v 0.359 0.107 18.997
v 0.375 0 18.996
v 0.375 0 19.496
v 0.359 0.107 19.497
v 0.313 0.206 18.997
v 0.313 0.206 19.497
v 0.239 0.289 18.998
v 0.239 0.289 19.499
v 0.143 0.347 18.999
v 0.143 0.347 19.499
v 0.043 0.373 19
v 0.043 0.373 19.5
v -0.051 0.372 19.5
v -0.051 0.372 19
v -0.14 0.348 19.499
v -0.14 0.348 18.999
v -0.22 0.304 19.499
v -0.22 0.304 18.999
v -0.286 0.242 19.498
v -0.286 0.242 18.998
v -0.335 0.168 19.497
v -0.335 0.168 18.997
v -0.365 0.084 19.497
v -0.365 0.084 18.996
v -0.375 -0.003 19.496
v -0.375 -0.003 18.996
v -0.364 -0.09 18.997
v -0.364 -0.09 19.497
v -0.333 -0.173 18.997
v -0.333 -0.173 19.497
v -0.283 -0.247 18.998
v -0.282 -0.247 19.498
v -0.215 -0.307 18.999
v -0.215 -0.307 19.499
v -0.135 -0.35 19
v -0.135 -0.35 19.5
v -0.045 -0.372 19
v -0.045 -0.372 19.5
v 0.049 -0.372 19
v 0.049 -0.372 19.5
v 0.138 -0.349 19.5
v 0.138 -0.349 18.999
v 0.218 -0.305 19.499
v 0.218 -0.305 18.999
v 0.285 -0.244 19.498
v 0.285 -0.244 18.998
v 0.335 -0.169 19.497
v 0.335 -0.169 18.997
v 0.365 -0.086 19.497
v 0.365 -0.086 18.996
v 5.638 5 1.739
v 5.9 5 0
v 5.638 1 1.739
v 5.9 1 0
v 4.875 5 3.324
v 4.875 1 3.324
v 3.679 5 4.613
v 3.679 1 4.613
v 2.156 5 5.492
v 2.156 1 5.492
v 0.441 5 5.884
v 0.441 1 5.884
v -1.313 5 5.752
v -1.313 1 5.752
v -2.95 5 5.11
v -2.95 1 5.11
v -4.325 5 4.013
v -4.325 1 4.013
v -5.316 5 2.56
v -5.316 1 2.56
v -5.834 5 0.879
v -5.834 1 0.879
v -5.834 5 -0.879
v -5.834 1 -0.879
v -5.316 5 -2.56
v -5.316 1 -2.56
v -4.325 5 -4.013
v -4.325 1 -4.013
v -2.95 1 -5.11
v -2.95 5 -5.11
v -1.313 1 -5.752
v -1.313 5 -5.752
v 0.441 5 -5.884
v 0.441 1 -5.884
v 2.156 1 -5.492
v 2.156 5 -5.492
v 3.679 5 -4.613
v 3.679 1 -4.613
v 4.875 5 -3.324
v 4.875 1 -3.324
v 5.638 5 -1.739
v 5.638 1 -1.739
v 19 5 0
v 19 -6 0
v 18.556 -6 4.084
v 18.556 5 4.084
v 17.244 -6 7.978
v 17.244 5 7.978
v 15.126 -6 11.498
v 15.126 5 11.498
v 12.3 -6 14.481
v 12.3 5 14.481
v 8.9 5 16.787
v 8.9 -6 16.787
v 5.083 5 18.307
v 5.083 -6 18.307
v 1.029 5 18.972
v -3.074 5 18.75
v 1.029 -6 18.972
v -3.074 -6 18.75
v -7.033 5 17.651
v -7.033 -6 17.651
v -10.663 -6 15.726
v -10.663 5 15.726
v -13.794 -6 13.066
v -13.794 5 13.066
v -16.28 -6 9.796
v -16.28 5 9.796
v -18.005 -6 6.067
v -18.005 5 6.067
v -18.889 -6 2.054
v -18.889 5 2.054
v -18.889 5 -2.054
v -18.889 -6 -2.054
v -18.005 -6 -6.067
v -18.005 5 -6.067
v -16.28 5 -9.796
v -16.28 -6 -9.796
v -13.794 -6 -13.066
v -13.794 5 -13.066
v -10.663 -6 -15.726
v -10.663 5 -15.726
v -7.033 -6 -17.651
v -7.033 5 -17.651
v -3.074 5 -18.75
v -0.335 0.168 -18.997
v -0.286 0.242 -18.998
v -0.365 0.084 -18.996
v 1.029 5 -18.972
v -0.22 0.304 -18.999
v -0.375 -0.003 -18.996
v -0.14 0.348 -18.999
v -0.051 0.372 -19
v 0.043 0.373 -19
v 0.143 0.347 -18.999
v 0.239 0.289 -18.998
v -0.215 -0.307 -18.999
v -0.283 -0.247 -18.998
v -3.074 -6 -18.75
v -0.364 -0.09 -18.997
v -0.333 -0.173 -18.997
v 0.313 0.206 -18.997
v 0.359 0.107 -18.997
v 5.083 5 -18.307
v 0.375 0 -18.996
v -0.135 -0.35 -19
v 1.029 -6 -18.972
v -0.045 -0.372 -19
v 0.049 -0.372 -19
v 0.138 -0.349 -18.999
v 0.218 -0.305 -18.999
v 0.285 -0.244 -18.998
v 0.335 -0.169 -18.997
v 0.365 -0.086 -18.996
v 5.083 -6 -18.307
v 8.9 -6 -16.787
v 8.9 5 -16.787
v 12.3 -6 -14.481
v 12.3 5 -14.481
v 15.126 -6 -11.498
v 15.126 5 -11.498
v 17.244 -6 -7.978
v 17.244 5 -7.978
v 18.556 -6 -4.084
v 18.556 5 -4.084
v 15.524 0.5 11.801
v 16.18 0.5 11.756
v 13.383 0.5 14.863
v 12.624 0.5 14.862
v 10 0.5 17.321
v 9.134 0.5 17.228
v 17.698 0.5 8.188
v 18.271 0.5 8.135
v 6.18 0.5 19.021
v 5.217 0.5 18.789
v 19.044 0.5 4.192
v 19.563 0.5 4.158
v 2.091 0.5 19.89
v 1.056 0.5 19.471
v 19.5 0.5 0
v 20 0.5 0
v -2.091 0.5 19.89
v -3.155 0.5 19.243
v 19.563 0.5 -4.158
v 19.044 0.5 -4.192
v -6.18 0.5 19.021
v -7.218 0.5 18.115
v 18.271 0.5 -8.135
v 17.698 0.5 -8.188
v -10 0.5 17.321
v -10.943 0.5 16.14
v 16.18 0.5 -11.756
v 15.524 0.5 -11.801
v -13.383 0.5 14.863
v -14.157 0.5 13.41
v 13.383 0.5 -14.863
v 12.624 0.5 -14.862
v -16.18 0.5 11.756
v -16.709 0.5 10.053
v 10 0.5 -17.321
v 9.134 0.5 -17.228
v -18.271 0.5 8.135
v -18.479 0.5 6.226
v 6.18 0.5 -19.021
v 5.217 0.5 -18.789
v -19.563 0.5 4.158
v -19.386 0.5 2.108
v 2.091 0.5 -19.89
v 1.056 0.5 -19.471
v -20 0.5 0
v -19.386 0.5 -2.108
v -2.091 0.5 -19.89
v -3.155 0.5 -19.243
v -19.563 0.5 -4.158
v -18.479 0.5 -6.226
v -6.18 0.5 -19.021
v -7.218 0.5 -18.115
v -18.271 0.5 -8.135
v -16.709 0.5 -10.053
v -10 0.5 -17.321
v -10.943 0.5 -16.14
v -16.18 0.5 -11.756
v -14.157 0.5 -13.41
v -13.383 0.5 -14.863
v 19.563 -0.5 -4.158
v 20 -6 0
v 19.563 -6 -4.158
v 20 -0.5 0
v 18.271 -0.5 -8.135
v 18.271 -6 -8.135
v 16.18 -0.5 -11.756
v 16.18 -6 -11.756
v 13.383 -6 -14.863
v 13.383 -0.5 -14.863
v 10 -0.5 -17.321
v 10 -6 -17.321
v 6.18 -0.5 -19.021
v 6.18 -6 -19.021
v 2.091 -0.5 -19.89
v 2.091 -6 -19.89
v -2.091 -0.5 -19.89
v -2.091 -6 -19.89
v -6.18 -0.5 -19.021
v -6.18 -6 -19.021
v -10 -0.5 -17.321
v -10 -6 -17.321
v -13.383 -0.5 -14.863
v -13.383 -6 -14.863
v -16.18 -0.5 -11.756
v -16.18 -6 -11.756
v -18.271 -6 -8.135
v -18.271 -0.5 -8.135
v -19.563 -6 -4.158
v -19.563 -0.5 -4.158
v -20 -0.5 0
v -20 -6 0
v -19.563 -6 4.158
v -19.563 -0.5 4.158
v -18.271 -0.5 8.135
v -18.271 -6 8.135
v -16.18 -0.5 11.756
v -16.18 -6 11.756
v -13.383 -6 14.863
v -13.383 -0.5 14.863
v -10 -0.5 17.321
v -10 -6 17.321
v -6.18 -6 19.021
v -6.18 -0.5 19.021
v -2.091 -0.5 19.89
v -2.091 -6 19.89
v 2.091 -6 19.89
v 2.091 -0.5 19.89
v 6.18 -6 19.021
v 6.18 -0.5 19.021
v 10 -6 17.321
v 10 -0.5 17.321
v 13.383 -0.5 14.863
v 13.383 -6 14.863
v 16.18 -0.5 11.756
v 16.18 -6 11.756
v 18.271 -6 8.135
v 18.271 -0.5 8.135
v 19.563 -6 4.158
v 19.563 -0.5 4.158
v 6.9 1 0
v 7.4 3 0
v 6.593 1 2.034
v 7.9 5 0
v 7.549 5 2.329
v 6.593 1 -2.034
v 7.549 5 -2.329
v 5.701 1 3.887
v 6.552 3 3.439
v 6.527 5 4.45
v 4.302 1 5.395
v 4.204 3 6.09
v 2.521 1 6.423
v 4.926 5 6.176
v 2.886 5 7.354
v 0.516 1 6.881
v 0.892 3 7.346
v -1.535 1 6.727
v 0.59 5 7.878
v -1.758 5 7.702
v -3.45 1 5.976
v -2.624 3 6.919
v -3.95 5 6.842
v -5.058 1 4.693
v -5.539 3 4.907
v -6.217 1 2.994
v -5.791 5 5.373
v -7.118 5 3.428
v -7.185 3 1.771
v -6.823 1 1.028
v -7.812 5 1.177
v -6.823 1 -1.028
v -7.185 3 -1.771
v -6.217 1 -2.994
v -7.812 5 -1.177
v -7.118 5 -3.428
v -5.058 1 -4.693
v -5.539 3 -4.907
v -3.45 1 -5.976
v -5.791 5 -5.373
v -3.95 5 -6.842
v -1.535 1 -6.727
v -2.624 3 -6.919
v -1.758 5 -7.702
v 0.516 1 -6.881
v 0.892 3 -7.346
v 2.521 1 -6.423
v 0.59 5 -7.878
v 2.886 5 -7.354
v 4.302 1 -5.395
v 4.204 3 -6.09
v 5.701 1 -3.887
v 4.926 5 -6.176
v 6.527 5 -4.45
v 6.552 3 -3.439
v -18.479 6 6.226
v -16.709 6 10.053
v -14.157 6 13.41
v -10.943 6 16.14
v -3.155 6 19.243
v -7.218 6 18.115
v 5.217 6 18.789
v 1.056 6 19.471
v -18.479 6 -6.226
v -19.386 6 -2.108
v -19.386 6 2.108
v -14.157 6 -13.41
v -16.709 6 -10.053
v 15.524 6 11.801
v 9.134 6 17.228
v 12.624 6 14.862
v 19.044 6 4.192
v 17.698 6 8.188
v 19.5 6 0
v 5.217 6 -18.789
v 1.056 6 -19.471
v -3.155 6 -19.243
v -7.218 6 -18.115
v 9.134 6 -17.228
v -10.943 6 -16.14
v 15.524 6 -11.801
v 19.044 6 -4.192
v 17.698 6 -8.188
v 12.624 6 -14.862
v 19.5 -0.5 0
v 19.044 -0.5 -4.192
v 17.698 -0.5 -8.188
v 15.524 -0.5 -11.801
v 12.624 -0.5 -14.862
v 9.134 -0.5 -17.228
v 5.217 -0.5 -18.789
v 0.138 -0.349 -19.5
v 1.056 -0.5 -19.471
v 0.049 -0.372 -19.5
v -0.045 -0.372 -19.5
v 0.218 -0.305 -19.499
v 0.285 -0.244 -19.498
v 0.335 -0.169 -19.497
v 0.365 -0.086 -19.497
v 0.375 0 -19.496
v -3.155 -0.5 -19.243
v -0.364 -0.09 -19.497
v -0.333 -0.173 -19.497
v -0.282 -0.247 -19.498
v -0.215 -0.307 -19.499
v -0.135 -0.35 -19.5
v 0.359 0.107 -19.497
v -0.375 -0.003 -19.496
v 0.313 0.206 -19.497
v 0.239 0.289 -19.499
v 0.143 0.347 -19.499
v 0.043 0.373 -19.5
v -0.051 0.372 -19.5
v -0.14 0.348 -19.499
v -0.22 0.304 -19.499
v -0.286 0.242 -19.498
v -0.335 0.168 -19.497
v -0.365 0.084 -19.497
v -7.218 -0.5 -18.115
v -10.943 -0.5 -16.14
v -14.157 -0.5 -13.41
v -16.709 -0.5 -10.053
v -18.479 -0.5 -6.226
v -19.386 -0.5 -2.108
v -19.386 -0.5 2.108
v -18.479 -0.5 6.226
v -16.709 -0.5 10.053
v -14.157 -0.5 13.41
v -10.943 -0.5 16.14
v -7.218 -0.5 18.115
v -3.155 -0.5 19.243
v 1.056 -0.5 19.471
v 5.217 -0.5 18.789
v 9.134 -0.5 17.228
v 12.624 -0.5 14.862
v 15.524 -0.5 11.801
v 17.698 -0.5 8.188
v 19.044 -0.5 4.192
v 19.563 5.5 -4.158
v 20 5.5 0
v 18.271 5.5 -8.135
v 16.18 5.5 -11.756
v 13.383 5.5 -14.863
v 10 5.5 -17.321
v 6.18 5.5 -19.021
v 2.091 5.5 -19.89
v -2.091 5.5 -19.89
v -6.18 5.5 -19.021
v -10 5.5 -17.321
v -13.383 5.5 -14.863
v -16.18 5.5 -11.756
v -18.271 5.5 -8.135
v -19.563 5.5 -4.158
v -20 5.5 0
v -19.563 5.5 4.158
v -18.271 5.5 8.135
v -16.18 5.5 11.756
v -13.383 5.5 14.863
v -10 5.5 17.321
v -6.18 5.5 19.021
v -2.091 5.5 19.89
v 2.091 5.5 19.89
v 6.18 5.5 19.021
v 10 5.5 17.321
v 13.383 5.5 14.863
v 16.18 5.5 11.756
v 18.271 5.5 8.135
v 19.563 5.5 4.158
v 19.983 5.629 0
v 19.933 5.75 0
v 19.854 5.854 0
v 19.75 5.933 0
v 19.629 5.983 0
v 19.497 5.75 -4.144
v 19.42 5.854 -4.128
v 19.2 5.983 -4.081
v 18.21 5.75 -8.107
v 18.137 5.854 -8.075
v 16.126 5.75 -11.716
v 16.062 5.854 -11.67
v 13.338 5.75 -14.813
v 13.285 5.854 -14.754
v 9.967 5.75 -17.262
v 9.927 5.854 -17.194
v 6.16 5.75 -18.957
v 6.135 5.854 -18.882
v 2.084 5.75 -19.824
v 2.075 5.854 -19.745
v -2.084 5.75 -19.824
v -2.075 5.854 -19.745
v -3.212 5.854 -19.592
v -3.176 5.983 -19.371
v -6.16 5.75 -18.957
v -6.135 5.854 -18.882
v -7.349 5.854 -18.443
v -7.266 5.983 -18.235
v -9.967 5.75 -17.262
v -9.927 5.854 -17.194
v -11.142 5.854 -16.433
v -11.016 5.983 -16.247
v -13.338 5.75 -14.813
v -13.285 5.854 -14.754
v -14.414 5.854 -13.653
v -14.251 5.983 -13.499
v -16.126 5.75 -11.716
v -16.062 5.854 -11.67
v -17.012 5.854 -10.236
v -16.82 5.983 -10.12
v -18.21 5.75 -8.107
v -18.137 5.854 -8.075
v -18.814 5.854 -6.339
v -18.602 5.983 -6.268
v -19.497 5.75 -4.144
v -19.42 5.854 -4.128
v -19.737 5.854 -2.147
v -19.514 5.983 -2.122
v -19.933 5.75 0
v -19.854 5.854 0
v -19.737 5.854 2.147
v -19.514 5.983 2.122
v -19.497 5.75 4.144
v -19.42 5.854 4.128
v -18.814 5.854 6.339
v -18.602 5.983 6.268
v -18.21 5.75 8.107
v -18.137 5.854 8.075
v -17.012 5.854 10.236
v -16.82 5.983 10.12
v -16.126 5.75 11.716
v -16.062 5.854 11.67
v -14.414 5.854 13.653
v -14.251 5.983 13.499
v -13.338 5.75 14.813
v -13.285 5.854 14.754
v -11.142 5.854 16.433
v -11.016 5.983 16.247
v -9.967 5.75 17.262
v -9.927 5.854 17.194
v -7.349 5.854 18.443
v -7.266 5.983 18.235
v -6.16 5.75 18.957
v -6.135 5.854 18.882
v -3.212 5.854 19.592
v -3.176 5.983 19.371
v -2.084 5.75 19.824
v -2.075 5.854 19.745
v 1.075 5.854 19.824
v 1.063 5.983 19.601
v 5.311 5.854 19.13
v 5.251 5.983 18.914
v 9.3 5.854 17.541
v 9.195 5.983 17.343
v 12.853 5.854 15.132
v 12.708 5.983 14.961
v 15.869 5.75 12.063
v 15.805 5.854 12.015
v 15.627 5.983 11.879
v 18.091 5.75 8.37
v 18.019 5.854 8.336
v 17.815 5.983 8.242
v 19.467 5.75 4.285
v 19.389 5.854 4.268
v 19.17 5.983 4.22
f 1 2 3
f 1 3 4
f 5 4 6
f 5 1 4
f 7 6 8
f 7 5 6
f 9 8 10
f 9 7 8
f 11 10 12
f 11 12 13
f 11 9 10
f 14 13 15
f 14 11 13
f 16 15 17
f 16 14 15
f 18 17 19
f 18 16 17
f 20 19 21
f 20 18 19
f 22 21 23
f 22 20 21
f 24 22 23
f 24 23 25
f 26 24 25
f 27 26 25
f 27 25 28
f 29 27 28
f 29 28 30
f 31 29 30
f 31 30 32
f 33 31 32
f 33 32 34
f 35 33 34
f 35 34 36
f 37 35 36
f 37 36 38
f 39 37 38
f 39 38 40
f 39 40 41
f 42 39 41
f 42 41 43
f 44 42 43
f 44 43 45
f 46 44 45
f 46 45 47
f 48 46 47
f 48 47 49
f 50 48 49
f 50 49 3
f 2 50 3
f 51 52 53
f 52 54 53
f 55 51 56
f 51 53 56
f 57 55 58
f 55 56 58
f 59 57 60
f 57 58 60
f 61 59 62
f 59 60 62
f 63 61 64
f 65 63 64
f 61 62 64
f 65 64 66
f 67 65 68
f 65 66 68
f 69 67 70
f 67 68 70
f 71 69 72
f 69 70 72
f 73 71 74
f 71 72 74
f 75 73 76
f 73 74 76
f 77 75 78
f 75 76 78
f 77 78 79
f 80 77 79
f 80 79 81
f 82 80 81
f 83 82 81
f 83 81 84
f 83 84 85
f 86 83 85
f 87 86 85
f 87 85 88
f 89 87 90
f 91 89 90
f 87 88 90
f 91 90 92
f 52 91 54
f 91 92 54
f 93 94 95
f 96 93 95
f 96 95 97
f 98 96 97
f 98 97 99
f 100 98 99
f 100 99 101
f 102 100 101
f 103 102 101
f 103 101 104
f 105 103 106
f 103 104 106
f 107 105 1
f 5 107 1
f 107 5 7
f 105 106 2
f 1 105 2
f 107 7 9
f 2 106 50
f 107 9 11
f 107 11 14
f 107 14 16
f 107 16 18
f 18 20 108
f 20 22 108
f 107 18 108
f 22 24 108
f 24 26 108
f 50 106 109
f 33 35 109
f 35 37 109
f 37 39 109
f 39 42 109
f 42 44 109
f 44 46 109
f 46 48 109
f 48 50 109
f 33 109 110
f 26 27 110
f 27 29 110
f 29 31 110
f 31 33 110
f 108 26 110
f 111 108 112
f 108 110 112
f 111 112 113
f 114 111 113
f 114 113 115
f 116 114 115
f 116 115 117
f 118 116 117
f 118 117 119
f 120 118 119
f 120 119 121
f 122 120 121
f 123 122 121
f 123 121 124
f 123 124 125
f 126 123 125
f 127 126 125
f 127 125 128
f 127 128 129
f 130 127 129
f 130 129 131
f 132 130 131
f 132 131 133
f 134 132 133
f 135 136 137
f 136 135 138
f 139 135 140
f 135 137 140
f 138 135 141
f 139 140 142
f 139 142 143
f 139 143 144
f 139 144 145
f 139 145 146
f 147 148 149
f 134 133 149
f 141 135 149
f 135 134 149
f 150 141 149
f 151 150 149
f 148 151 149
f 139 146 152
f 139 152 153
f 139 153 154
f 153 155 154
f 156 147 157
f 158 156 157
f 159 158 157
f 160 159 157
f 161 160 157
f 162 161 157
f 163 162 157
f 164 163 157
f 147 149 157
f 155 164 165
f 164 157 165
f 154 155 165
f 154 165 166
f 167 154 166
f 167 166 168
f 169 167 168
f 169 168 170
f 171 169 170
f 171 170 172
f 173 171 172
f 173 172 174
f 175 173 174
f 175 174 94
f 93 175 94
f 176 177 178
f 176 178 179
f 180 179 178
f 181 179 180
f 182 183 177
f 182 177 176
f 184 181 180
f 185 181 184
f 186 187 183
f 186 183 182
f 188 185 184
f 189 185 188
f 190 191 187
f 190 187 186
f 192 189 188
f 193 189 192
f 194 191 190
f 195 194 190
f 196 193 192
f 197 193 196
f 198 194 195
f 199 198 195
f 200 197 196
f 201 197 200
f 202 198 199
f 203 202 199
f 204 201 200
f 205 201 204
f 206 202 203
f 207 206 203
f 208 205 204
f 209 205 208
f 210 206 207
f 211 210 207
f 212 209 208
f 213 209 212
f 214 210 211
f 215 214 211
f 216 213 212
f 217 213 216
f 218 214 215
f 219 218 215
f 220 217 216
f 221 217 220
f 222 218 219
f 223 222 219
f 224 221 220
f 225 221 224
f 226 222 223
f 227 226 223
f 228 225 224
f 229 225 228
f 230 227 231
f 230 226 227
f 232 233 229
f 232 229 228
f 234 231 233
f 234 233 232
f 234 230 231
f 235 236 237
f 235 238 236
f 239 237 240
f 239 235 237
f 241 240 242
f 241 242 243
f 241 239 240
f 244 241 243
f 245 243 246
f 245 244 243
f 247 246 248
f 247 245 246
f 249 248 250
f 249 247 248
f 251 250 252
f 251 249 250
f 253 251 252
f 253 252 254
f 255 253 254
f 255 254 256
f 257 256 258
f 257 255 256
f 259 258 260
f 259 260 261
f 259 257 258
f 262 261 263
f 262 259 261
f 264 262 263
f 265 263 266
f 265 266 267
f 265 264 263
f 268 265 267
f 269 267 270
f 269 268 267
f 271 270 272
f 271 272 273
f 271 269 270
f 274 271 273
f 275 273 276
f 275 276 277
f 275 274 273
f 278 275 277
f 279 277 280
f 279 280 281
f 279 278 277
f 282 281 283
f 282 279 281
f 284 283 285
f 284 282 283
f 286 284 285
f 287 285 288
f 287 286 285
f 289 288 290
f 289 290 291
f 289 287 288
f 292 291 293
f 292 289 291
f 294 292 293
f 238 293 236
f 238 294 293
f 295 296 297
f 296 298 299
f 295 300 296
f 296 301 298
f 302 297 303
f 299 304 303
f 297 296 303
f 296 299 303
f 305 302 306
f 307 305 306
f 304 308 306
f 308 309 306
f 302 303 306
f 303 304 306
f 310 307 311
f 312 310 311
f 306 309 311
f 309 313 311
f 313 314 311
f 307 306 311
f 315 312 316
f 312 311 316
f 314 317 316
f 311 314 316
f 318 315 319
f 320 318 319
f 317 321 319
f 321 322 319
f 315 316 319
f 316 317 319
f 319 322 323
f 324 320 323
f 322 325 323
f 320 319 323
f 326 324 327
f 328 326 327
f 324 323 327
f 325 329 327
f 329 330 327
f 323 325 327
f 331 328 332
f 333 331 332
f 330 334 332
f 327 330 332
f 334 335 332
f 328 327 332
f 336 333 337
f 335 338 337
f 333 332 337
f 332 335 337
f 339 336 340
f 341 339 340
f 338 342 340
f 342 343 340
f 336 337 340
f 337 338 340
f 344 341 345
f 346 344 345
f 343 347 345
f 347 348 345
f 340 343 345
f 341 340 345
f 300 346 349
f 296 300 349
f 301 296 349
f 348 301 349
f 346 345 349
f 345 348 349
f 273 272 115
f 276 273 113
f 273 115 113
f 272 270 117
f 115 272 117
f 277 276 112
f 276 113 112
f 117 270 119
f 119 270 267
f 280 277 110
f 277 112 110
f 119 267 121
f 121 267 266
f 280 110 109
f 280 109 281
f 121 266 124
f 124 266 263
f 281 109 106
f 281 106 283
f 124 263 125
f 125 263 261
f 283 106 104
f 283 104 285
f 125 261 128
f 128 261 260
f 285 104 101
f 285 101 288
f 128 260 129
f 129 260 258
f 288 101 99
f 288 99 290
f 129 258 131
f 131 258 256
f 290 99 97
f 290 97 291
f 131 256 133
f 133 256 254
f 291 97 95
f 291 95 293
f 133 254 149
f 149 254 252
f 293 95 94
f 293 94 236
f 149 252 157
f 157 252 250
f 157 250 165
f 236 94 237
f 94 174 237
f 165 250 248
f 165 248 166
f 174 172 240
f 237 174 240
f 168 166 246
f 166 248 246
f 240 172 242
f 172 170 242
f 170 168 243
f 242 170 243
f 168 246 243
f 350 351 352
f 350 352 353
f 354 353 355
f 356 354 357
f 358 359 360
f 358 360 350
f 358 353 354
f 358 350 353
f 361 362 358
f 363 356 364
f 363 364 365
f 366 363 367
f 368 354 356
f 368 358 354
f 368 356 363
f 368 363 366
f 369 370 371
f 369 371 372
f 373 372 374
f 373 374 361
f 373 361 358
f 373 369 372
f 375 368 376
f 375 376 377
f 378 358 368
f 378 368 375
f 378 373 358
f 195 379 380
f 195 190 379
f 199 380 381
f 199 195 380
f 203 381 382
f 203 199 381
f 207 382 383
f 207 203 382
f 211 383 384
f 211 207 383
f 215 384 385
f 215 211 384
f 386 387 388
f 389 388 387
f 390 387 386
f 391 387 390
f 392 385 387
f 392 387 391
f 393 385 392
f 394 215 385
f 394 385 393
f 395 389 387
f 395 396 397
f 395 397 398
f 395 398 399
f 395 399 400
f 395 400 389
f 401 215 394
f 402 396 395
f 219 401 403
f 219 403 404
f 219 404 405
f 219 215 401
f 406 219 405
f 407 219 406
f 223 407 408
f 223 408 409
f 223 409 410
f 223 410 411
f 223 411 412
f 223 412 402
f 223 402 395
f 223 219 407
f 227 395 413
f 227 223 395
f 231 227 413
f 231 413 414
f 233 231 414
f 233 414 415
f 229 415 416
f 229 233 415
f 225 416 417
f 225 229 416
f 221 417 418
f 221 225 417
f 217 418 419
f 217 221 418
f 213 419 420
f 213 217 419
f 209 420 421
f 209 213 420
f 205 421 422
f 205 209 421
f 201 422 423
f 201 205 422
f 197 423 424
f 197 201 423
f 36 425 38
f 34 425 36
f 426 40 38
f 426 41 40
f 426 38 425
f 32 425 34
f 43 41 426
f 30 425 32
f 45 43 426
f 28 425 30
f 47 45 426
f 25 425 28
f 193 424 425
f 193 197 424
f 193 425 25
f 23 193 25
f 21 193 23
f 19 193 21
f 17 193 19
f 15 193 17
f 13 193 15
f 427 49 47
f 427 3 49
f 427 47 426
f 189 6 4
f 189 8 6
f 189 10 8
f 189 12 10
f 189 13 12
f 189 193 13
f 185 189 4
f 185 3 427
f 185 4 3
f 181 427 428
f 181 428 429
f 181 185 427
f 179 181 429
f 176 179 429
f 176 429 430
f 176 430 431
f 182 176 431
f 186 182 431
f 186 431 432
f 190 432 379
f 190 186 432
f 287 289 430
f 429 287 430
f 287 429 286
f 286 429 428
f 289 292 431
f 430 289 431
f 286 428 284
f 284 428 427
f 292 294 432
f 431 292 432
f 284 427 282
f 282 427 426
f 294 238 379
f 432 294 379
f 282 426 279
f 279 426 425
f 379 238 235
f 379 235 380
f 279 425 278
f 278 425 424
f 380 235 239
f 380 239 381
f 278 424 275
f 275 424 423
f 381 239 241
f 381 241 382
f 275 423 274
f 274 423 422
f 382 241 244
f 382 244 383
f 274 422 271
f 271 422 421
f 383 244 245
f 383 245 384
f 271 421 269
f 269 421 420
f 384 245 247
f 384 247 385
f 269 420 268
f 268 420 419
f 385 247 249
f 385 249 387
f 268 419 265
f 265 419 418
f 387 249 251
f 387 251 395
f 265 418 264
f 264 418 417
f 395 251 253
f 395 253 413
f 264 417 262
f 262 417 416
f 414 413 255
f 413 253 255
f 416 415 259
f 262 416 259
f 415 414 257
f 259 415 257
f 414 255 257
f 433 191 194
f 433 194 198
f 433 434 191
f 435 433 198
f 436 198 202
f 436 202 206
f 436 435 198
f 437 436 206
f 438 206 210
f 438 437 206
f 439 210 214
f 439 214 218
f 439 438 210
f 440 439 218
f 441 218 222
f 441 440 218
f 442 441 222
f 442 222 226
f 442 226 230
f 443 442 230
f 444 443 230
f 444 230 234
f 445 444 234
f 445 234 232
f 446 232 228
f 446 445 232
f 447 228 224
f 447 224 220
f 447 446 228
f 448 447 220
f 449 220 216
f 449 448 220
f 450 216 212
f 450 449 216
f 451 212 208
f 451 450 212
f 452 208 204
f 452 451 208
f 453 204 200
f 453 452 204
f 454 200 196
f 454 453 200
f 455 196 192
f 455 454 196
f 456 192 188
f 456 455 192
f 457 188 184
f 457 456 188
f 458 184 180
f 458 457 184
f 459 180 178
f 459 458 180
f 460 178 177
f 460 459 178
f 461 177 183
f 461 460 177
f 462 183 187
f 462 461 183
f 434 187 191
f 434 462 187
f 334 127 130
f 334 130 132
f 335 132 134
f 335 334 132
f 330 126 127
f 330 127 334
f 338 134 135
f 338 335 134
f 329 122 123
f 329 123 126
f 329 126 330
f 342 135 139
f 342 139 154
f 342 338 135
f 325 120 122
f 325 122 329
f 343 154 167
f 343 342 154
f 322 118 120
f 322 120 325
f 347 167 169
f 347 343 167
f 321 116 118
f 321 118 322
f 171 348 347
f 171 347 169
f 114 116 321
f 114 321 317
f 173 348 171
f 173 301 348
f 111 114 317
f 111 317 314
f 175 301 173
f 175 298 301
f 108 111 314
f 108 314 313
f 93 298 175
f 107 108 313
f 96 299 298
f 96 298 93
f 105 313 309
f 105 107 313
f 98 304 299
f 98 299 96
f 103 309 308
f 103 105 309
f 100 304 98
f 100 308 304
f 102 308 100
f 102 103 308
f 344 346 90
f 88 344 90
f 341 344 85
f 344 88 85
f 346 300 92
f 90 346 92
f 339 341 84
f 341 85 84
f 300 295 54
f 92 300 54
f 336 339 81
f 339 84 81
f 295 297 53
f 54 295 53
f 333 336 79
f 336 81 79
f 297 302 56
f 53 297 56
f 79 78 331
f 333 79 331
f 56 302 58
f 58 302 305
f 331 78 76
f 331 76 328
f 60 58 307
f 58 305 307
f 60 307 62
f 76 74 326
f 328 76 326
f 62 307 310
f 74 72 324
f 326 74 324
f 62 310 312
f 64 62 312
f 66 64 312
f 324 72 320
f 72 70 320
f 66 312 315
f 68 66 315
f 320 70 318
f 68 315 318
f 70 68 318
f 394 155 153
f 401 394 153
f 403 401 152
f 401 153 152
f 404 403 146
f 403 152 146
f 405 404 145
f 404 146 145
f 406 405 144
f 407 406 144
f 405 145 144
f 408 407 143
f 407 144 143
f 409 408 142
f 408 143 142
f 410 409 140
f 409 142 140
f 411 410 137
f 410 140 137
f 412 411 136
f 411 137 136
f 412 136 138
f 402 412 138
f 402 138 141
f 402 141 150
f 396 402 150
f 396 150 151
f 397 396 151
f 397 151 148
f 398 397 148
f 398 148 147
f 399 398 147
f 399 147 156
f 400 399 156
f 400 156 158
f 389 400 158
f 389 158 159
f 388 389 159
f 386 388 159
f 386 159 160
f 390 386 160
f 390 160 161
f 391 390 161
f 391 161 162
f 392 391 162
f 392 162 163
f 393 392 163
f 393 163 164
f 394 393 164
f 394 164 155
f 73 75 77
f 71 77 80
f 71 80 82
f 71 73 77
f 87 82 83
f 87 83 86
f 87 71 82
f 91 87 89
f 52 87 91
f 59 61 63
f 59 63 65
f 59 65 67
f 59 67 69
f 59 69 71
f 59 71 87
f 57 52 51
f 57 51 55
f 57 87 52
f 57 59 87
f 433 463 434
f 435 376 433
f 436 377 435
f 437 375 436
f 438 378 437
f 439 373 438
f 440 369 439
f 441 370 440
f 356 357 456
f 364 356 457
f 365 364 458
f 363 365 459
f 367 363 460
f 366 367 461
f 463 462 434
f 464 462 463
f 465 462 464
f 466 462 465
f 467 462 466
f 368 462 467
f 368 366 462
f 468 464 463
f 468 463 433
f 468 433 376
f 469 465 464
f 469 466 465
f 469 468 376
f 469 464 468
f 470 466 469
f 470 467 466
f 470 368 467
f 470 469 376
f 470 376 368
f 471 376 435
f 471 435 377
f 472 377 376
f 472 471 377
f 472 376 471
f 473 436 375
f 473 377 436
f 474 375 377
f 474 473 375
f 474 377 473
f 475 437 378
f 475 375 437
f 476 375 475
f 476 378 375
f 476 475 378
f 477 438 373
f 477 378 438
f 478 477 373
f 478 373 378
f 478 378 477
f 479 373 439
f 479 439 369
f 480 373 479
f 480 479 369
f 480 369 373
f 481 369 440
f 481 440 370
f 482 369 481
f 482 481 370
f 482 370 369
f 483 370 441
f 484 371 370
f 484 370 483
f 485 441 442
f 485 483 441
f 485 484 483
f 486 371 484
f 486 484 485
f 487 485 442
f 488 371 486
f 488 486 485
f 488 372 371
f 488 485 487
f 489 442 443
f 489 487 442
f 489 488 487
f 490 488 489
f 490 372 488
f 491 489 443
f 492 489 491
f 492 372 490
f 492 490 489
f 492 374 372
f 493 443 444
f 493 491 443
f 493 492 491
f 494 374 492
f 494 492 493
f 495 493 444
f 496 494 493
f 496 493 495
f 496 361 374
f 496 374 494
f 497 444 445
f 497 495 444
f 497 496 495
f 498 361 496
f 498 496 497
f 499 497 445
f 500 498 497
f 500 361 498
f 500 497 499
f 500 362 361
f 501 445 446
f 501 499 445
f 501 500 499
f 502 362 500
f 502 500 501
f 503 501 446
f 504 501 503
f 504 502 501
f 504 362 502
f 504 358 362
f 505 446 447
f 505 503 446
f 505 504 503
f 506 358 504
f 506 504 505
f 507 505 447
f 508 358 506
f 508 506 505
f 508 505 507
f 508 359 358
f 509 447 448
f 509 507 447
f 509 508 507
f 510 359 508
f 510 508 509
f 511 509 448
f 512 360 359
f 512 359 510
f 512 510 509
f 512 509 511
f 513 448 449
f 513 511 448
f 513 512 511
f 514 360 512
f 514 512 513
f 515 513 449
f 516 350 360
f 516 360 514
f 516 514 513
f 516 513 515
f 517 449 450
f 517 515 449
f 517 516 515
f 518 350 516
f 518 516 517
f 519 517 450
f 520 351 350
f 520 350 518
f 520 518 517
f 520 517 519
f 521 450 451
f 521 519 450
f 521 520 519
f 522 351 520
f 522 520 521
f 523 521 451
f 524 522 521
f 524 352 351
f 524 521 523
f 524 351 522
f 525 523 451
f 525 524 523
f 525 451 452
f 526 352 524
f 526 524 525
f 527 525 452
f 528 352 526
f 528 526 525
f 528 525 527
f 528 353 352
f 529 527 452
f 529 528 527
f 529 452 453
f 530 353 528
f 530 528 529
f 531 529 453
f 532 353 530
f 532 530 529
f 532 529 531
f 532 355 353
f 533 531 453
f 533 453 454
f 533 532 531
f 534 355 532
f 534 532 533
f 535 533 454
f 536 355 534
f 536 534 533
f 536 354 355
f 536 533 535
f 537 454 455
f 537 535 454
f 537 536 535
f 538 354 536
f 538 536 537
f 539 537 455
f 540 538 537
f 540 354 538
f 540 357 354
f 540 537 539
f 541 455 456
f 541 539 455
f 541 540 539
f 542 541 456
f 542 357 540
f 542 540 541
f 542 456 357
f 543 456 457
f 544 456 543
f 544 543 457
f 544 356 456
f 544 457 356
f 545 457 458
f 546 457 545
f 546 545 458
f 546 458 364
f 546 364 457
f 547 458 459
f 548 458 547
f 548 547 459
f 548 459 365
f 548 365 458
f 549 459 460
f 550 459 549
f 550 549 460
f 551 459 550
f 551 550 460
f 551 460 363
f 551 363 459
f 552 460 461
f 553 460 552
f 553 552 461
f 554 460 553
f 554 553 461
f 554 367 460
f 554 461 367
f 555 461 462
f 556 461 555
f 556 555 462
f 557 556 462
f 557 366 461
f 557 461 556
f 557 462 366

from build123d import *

# Parameters (mm, degrees)
SKETCH2_R               = 20
BOSS_EXTRUDE1_DEPTH     = 6
SKETCH3_R               = 19
CUT_EXTRUDE1_DEPTH      = 11
FILLET1_R               = 0.5
SKETCH5_W               = 0.5
SKETCH5_H               = 1
SKETCH6_R               = 0.375
CUT_EXTRUDE2_DEPTH      = 21.0000001
CUT_EXTRUDE2_DEPTH_BACK = 21.0000001


with BuildPart() as part:
    # Sketch2 → Boss-Extrude1 (new body, symmetric)
    with BuildSketch(Plane(origin=(0, 0, 0), x_dir=(1, 0, 0), z_dir=(0, 1, 0))):
        Circle(SKETCH2_R)
    extrude(amount=BOSS_EXTRUDE1_DEPTH, both=True)

    # Sketch3 → Cut-Extrude1 (cut)
    with BuildSketch(Plane.XZ.offset(6)):
        Circle(SKETCH3_R)
    extrude(amount=-CUT_EXTRUDE1_DEPTH, mode=Mode.SUBTRACT)

    # Fillet1
    fillet1_edges = [part.edges().sort_by_distance(p)[0] for p in [
        (-20, 6, 0),
    ]]
    fillet(fillet1_edges, radius=FILLET1_R)

    # Sketch5 → Cut-Revolve1 (revolve, cut)
    with BuildSketch(Plane.XY):
        with Locations((19.75, 0)):
            Rectangle(SKETCH5_W, SKETCH5_H)
    revolve(axis=Axis((0, 0, 0), (0, 1, 0)), mode=Mode.SUBTRACT)

    # Sketch6 → Cut-Extrude2 (cut, two sides)
    with BuildSketch(Plane.XY) as cut_extrude2_sk:
        Circle(SKETCH6_R)
    extrude(amount=CUT_EXTRUDE2_DEPTH, mode=Mode.SUBTRACT)
    extrude(cut_extrude2_sk.sketch, amount=-CUT_EXTRUDE2_DEPTH_BACK, mode=Mode.SUBTRACT)

    # Sketch7 → Revolve1 (revolve)
    with BuildSketch(Plane.XY):
        Polygon((5.9, 5), (5.9, 1), (6.9, 1), (7.9, 5), align=None)
    revolve(axis=Axis((0, 5, 0), (0, -1, 0)))


solid = part.part
